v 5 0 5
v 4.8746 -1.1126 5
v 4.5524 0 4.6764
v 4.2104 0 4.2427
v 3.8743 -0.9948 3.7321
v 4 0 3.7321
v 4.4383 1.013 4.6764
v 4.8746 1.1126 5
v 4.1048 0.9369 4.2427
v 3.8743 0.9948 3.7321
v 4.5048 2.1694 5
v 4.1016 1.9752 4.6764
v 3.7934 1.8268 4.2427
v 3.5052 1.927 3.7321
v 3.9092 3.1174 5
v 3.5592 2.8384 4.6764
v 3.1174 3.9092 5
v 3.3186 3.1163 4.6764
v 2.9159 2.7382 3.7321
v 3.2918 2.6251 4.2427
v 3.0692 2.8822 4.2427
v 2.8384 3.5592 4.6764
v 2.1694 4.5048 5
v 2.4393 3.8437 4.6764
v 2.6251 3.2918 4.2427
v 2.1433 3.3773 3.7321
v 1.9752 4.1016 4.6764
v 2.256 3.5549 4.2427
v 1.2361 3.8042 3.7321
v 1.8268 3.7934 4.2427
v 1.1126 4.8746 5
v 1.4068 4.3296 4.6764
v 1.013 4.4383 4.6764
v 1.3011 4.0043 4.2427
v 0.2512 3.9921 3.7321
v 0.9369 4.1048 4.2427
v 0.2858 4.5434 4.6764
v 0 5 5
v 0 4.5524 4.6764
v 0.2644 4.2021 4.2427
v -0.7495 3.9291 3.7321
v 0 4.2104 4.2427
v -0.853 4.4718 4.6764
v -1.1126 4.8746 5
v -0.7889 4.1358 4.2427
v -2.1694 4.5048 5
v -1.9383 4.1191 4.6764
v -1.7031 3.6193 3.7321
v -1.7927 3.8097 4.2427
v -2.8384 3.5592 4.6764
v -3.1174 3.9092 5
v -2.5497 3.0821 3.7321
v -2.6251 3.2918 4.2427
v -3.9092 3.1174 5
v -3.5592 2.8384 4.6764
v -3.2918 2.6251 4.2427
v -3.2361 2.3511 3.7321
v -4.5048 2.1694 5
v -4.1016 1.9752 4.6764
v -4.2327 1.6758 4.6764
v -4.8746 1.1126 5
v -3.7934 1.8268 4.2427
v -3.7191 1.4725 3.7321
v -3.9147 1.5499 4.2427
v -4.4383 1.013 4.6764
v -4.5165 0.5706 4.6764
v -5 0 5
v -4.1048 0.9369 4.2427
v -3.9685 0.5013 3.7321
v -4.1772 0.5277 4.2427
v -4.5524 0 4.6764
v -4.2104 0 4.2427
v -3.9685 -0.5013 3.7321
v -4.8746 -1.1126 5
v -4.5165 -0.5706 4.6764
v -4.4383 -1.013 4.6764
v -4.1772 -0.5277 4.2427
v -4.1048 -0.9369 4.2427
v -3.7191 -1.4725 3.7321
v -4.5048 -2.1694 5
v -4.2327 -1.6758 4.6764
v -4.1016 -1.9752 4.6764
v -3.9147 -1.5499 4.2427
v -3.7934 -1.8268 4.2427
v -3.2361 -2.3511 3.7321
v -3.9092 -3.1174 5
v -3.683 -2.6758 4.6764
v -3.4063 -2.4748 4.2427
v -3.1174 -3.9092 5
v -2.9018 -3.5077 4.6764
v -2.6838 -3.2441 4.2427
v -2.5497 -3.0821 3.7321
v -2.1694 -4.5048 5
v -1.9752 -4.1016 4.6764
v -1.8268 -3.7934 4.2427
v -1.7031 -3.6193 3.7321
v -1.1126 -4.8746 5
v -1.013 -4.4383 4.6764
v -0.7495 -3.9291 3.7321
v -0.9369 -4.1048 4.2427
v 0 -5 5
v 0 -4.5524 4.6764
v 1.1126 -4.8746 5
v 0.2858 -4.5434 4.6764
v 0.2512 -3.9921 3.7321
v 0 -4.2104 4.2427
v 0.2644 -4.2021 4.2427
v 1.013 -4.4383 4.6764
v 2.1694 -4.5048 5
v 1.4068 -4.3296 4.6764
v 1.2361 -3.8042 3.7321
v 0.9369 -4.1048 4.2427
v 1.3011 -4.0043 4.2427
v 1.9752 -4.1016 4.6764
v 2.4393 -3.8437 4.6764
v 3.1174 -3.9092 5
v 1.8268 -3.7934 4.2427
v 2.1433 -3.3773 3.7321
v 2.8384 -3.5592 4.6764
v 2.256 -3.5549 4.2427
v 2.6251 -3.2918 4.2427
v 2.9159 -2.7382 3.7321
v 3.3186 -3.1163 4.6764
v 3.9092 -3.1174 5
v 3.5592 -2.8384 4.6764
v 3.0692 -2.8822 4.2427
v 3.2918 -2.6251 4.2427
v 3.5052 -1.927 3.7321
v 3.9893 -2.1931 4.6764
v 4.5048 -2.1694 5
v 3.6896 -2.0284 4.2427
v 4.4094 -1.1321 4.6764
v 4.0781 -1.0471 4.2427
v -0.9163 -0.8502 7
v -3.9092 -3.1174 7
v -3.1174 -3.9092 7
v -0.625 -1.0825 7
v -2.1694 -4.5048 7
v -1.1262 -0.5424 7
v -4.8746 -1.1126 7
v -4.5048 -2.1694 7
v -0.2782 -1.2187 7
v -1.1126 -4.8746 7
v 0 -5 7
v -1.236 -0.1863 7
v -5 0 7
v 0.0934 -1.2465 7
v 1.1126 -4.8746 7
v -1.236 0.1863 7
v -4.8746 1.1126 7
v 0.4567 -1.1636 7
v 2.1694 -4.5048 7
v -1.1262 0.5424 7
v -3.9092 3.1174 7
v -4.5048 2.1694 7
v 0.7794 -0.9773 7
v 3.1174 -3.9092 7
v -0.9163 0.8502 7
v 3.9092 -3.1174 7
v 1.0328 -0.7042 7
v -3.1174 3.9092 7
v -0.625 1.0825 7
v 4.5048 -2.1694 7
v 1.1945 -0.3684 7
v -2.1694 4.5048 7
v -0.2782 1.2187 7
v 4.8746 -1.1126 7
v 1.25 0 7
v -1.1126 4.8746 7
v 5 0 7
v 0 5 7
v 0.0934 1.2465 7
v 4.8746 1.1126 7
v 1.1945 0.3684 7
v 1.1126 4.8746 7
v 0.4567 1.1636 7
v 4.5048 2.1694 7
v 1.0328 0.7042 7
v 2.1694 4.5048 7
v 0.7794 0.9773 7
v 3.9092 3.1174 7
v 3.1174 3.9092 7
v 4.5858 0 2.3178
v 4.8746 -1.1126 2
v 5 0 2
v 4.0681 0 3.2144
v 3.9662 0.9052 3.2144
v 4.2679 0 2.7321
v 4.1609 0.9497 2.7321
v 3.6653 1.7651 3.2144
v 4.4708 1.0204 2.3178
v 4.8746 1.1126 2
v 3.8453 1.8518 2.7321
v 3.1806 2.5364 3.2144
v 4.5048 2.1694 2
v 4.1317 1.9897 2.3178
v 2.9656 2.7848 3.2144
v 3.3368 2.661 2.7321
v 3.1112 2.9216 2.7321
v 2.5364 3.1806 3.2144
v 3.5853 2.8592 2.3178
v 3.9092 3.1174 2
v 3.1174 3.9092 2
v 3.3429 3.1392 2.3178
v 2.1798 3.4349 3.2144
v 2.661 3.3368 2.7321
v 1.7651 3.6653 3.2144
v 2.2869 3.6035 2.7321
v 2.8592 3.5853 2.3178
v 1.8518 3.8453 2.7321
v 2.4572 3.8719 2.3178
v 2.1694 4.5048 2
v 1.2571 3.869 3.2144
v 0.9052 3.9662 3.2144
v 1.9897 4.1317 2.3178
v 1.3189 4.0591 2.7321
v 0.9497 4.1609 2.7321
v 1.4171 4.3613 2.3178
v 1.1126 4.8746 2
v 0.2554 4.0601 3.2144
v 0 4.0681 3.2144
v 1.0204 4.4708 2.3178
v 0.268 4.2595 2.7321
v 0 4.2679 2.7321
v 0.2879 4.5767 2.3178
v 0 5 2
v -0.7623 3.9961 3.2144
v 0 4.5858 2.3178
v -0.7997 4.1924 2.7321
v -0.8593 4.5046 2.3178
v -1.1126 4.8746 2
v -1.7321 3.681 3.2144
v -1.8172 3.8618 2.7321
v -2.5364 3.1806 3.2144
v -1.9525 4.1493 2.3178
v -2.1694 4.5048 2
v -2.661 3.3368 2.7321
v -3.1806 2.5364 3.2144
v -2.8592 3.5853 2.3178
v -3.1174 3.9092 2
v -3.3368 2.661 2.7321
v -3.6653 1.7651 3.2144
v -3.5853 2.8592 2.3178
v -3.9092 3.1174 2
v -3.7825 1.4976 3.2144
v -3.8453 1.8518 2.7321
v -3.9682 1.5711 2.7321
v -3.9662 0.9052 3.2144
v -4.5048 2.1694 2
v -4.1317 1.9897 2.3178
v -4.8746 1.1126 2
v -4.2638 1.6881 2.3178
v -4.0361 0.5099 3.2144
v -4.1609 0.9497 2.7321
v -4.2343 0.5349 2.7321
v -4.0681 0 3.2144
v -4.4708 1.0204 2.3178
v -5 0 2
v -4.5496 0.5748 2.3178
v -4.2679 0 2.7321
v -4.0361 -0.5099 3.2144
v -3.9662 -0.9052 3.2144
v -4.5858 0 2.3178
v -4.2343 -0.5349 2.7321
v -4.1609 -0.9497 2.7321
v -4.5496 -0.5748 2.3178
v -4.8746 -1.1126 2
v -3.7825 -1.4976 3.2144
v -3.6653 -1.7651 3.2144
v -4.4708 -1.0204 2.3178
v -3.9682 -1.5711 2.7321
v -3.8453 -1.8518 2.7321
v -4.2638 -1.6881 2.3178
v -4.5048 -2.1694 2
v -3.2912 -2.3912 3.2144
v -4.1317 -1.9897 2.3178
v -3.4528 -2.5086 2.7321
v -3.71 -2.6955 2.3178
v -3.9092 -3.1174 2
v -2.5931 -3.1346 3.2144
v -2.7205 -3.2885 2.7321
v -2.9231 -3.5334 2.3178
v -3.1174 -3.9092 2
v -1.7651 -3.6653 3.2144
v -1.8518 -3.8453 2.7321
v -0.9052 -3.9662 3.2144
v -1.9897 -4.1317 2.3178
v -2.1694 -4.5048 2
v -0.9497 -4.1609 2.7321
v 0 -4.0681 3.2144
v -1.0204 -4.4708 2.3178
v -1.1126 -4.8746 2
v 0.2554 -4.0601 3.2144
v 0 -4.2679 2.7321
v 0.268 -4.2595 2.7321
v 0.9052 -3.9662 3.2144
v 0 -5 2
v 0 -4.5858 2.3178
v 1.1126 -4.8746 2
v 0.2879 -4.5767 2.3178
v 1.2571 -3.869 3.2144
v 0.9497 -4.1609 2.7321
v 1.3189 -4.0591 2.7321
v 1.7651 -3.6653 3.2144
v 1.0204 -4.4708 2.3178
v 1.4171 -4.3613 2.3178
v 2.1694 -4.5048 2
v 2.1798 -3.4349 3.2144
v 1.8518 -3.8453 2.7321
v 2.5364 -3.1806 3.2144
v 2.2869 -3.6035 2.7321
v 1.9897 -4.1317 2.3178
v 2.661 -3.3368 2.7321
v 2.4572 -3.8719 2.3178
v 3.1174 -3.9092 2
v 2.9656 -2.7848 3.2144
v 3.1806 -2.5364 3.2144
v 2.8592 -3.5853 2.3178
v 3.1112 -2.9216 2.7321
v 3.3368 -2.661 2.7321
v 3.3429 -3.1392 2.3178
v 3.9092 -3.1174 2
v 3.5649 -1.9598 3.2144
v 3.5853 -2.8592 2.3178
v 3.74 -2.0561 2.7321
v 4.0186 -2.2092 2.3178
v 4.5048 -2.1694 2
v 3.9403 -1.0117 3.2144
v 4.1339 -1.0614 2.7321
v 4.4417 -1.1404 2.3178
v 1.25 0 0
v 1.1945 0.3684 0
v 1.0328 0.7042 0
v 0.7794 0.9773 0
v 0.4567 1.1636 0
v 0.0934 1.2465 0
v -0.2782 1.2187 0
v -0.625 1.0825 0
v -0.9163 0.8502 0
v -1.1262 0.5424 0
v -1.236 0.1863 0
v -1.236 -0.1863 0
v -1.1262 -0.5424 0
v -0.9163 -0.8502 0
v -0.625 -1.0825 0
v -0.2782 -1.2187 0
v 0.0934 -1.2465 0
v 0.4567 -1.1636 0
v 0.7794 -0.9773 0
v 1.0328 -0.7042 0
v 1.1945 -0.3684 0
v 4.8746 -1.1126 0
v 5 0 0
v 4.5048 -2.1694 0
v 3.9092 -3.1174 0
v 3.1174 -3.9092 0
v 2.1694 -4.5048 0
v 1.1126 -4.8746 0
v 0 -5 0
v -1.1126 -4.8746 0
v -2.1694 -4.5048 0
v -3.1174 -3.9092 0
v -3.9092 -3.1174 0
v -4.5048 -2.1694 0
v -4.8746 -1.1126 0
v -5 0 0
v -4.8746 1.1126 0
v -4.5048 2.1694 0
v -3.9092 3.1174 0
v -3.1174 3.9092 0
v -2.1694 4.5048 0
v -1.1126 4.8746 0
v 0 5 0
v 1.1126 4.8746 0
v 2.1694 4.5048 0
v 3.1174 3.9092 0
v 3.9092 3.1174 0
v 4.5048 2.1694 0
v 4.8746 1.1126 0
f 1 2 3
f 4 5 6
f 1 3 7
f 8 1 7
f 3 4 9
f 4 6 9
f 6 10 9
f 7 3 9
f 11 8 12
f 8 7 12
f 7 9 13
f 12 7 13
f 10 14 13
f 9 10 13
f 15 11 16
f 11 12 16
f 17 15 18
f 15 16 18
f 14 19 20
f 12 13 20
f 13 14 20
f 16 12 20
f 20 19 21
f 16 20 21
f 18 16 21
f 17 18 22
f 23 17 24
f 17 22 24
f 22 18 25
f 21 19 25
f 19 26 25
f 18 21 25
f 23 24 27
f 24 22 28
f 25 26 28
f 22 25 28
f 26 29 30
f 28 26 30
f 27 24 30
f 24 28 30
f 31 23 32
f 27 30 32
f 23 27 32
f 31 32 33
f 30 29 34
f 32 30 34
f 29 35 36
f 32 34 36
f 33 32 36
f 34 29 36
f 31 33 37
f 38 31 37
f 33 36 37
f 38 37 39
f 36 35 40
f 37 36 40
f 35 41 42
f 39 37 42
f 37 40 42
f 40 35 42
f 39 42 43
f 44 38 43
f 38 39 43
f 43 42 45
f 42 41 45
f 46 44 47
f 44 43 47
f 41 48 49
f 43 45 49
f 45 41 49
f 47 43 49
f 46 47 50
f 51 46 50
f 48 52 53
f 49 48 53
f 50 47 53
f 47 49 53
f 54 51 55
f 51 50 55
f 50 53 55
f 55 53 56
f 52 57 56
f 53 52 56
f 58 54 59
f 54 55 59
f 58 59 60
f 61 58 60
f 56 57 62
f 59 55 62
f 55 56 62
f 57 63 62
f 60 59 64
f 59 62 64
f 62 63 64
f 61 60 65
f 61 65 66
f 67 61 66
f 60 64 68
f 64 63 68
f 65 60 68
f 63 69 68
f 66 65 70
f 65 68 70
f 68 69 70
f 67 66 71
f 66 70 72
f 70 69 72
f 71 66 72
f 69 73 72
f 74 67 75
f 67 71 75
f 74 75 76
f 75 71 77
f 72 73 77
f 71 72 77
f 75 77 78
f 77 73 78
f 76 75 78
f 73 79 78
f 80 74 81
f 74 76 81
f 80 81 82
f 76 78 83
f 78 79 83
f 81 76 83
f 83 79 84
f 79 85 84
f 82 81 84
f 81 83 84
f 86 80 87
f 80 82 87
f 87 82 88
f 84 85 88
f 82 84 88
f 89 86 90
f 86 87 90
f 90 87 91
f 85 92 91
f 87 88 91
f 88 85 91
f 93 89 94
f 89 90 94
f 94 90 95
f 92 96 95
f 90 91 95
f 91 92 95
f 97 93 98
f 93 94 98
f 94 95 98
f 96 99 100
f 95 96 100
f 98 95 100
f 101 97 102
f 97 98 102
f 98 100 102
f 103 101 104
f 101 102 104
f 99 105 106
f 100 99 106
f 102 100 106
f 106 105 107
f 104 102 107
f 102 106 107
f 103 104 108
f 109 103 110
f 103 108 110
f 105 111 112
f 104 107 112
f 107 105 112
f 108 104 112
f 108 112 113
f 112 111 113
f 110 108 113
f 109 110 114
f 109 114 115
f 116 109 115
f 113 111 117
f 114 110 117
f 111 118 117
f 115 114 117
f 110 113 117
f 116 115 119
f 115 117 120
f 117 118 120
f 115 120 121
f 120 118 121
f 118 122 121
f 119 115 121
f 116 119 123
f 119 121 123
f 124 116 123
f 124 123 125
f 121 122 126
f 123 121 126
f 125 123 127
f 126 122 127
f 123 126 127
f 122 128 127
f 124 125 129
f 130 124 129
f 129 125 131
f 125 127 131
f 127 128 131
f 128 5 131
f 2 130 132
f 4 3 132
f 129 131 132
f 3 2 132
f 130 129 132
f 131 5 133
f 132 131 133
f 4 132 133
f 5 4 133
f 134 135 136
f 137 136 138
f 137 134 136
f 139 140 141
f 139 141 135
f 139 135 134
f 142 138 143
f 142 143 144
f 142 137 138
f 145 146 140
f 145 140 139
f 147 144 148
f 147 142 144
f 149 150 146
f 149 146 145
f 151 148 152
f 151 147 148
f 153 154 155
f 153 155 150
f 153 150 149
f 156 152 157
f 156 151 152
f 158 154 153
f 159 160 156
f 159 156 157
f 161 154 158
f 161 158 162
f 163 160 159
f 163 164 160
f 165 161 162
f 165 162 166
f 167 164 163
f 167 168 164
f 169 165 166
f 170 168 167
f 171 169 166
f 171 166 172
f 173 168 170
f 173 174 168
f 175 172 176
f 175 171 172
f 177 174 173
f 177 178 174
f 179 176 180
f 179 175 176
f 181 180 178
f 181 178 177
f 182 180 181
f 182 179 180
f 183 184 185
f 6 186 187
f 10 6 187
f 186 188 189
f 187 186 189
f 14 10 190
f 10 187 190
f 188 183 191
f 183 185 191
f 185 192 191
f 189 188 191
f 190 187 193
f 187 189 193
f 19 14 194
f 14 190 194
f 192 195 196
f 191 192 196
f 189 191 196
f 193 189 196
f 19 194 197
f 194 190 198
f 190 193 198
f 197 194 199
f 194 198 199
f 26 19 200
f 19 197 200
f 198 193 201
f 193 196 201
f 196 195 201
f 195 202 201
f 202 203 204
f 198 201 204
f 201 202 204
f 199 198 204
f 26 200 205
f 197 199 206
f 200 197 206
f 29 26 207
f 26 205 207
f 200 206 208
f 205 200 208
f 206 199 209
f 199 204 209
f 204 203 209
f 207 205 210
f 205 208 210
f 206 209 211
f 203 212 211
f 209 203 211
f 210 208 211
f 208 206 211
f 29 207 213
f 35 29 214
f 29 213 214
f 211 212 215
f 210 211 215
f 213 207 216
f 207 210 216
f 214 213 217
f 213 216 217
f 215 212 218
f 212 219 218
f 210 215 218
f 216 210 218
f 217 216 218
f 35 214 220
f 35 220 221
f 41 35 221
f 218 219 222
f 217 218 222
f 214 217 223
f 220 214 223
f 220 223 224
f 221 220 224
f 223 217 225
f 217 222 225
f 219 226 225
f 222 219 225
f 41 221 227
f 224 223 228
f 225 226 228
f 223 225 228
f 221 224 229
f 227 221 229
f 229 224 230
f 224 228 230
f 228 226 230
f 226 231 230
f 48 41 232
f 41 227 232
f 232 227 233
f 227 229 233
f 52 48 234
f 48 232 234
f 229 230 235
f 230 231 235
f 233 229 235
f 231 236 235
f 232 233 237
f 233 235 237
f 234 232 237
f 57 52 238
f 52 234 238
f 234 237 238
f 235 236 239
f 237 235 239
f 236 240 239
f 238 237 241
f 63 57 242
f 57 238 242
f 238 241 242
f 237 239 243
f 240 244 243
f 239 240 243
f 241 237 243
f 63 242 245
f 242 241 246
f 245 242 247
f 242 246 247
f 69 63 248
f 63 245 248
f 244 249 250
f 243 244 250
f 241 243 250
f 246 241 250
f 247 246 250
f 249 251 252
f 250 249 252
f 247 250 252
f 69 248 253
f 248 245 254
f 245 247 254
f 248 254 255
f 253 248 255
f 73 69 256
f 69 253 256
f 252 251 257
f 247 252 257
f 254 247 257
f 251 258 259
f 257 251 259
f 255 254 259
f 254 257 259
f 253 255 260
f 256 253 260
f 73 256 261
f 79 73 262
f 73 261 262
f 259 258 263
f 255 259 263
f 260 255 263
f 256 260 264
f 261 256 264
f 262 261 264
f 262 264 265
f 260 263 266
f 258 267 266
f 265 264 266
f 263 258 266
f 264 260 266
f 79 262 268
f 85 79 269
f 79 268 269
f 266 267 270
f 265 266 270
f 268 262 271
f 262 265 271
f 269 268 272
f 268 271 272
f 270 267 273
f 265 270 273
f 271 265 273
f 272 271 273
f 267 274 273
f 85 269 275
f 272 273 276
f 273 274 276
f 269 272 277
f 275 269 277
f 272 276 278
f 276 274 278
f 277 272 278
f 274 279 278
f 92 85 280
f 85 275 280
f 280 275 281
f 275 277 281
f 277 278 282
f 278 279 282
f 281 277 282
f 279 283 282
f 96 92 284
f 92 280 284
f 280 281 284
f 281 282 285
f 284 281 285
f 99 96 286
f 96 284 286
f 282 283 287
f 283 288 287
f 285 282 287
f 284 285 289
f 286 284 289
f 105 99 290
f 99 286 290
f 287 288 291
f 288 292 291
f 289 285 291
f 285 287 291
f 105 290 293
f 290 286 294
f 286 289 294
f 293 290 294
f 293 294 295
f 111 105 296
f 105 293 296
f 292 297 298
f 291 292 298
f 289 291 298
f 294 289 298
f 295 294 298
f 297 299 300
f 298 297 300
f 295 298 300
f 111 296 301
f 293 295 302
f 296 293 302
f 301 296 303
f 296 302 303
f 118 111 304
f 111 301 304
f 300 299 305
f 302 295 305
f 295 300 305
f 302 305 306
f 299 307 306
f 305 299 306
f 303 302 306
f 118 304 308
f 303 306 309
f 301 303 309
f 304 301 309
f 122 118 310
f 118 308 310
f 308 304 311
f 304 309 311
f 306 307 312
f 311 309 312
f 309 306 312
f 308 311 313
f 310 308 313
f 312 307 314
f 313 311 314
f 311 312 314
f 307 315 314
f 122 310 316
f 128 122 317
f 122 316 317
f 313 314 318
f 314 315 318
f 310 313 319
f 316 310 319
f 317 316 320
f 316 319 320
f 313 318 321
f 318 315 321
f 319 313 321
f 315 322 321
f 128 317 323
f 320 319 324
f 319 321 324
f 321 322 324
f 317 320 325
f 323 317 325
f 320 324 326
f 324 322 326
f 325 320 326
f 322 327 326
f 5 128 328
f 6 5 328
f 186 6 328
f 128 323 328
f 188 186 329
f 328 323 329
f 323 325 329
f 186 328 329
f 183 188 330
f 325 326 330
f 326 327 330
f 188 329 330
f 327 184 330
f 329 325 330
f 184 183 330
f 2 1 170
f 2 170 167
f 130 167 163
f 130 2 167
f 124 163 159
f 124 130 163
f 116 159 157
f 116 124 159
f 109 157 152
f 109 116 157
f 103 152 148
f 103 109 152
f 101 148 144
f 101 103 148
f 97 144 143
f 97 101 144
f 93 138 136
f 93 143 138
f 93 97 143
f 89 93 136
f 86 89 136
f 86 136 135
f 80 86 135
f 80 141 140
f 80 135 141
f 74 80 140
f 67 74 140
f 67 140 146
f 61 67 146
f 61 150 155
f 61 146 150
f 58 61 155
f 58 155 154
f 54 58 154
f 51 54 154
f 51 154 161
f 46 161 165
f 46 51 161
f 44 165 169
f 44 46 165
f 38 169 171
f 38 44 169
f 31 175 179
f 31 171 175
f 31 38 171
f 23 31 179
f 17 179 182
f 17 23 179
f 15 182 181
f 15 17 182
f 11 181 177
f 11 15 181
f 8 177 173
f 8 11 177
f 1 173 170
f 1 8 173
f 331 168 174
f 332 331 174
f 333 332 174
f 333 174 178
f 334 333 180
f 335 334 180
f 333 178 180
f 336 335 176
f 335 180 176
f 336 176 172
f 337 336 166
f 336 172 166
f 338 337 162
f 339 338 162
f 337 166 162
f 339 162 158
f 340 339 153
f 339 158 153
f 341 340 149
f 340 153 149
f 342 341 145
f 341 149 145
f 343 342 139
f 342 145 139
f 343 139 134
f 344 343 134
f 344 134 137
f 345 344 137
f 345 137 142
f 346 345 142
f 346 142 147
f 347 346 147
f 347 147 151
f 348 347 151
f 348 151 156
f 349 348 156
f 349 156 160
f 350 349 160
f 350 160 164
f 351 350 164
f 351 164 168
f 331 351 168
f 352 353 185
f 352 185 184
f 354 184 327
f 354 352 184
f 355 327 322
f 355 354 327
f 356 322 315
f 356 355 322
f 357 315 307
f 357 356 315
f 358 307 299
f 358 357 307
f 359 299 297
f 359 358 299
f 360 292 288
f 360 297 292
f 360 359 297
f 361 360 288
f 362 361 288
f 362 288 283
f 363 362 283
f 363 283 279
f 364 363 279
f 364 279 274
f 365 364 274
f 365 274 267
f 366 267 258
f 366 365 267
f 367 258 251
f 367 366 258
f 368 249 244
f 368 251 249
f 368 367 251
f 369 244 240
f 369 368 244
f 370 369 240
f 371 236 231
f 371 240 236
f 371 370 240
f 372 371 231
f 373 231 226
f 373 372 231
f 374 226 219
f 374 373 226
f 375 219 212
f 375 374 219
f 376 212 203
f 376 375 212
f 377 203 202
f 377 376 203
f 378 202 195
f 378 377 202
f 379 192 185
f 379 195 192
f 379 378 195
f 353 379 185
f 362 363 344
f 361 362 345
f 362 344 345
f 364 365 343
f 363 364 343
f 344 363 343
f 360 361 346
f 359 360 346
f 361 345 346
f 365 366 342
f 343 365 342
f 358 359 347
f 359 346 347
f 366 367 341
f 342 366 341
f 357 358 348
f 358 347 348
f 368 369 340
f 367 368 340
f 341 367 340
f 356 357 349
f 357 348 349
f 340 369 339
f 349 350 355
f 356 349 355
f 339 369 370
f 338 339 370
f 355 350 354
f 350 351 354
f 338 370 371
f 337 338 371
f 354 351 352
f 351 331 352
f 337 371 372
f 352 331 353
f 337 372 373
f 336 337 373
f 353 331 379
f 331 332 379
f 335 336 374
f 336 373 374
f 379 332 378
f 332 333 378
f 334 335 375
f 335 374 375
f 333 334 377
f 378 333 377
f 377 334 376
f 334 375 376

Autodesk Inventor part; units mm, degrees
ref_plane "YZ Plane" through (0, 0, 0) normal (1, 0, 0) x (0, 1, 0)
ref_plane "XZ Plane" through (0, 0, 0) normal (0, 1, 0) x (-1, 0, 0)
ref_plane "XY Plane" through (0, 0, 0) normal (0, 0, 1) x (1, 0, 0)
sketch "Sketch1" plane through (0, 0, 0) normal (0, 0, 1) x (1, 0, 0)
  circle A0 centre (0, 0) radius 5
  dimension "d0" = 10
extrude "Extrusion1" add sketch "Sketch1" along normal blind 2
sketch "Sketch2" plane through (0, 0, 2) normal (0, 0, 1) x (1, 0, 0)
  circle A0 centre (0, 0) radius 4
  dimension "d3" = 8
extrude "Extrusion2" add sketch "Sketch2" along normal blind 3
sketch "Sketch3" plane through (0, 0, 5) normal (0, 0, 1) x (1, 0, 0)
  circle A0 centre (0, 0) radius 5
extrude "Extrusion3" add sketch "Sketch3" along normal blind 2
fillet "Fillet1" radius 2 2 edges at (-4, 0, 2) (-4, 0, 5)
sketch "Sketch4" plane through (0, 0, 7) normal (0, 0, 1) x (1, 0, 0)
  circle A0 centre (0, 0) radius 1.25
  dimension "d9" = 2.5
extrude "Extrusion4" cut sketch "Sketch4" against normal blind 20
properties part number "pully"
